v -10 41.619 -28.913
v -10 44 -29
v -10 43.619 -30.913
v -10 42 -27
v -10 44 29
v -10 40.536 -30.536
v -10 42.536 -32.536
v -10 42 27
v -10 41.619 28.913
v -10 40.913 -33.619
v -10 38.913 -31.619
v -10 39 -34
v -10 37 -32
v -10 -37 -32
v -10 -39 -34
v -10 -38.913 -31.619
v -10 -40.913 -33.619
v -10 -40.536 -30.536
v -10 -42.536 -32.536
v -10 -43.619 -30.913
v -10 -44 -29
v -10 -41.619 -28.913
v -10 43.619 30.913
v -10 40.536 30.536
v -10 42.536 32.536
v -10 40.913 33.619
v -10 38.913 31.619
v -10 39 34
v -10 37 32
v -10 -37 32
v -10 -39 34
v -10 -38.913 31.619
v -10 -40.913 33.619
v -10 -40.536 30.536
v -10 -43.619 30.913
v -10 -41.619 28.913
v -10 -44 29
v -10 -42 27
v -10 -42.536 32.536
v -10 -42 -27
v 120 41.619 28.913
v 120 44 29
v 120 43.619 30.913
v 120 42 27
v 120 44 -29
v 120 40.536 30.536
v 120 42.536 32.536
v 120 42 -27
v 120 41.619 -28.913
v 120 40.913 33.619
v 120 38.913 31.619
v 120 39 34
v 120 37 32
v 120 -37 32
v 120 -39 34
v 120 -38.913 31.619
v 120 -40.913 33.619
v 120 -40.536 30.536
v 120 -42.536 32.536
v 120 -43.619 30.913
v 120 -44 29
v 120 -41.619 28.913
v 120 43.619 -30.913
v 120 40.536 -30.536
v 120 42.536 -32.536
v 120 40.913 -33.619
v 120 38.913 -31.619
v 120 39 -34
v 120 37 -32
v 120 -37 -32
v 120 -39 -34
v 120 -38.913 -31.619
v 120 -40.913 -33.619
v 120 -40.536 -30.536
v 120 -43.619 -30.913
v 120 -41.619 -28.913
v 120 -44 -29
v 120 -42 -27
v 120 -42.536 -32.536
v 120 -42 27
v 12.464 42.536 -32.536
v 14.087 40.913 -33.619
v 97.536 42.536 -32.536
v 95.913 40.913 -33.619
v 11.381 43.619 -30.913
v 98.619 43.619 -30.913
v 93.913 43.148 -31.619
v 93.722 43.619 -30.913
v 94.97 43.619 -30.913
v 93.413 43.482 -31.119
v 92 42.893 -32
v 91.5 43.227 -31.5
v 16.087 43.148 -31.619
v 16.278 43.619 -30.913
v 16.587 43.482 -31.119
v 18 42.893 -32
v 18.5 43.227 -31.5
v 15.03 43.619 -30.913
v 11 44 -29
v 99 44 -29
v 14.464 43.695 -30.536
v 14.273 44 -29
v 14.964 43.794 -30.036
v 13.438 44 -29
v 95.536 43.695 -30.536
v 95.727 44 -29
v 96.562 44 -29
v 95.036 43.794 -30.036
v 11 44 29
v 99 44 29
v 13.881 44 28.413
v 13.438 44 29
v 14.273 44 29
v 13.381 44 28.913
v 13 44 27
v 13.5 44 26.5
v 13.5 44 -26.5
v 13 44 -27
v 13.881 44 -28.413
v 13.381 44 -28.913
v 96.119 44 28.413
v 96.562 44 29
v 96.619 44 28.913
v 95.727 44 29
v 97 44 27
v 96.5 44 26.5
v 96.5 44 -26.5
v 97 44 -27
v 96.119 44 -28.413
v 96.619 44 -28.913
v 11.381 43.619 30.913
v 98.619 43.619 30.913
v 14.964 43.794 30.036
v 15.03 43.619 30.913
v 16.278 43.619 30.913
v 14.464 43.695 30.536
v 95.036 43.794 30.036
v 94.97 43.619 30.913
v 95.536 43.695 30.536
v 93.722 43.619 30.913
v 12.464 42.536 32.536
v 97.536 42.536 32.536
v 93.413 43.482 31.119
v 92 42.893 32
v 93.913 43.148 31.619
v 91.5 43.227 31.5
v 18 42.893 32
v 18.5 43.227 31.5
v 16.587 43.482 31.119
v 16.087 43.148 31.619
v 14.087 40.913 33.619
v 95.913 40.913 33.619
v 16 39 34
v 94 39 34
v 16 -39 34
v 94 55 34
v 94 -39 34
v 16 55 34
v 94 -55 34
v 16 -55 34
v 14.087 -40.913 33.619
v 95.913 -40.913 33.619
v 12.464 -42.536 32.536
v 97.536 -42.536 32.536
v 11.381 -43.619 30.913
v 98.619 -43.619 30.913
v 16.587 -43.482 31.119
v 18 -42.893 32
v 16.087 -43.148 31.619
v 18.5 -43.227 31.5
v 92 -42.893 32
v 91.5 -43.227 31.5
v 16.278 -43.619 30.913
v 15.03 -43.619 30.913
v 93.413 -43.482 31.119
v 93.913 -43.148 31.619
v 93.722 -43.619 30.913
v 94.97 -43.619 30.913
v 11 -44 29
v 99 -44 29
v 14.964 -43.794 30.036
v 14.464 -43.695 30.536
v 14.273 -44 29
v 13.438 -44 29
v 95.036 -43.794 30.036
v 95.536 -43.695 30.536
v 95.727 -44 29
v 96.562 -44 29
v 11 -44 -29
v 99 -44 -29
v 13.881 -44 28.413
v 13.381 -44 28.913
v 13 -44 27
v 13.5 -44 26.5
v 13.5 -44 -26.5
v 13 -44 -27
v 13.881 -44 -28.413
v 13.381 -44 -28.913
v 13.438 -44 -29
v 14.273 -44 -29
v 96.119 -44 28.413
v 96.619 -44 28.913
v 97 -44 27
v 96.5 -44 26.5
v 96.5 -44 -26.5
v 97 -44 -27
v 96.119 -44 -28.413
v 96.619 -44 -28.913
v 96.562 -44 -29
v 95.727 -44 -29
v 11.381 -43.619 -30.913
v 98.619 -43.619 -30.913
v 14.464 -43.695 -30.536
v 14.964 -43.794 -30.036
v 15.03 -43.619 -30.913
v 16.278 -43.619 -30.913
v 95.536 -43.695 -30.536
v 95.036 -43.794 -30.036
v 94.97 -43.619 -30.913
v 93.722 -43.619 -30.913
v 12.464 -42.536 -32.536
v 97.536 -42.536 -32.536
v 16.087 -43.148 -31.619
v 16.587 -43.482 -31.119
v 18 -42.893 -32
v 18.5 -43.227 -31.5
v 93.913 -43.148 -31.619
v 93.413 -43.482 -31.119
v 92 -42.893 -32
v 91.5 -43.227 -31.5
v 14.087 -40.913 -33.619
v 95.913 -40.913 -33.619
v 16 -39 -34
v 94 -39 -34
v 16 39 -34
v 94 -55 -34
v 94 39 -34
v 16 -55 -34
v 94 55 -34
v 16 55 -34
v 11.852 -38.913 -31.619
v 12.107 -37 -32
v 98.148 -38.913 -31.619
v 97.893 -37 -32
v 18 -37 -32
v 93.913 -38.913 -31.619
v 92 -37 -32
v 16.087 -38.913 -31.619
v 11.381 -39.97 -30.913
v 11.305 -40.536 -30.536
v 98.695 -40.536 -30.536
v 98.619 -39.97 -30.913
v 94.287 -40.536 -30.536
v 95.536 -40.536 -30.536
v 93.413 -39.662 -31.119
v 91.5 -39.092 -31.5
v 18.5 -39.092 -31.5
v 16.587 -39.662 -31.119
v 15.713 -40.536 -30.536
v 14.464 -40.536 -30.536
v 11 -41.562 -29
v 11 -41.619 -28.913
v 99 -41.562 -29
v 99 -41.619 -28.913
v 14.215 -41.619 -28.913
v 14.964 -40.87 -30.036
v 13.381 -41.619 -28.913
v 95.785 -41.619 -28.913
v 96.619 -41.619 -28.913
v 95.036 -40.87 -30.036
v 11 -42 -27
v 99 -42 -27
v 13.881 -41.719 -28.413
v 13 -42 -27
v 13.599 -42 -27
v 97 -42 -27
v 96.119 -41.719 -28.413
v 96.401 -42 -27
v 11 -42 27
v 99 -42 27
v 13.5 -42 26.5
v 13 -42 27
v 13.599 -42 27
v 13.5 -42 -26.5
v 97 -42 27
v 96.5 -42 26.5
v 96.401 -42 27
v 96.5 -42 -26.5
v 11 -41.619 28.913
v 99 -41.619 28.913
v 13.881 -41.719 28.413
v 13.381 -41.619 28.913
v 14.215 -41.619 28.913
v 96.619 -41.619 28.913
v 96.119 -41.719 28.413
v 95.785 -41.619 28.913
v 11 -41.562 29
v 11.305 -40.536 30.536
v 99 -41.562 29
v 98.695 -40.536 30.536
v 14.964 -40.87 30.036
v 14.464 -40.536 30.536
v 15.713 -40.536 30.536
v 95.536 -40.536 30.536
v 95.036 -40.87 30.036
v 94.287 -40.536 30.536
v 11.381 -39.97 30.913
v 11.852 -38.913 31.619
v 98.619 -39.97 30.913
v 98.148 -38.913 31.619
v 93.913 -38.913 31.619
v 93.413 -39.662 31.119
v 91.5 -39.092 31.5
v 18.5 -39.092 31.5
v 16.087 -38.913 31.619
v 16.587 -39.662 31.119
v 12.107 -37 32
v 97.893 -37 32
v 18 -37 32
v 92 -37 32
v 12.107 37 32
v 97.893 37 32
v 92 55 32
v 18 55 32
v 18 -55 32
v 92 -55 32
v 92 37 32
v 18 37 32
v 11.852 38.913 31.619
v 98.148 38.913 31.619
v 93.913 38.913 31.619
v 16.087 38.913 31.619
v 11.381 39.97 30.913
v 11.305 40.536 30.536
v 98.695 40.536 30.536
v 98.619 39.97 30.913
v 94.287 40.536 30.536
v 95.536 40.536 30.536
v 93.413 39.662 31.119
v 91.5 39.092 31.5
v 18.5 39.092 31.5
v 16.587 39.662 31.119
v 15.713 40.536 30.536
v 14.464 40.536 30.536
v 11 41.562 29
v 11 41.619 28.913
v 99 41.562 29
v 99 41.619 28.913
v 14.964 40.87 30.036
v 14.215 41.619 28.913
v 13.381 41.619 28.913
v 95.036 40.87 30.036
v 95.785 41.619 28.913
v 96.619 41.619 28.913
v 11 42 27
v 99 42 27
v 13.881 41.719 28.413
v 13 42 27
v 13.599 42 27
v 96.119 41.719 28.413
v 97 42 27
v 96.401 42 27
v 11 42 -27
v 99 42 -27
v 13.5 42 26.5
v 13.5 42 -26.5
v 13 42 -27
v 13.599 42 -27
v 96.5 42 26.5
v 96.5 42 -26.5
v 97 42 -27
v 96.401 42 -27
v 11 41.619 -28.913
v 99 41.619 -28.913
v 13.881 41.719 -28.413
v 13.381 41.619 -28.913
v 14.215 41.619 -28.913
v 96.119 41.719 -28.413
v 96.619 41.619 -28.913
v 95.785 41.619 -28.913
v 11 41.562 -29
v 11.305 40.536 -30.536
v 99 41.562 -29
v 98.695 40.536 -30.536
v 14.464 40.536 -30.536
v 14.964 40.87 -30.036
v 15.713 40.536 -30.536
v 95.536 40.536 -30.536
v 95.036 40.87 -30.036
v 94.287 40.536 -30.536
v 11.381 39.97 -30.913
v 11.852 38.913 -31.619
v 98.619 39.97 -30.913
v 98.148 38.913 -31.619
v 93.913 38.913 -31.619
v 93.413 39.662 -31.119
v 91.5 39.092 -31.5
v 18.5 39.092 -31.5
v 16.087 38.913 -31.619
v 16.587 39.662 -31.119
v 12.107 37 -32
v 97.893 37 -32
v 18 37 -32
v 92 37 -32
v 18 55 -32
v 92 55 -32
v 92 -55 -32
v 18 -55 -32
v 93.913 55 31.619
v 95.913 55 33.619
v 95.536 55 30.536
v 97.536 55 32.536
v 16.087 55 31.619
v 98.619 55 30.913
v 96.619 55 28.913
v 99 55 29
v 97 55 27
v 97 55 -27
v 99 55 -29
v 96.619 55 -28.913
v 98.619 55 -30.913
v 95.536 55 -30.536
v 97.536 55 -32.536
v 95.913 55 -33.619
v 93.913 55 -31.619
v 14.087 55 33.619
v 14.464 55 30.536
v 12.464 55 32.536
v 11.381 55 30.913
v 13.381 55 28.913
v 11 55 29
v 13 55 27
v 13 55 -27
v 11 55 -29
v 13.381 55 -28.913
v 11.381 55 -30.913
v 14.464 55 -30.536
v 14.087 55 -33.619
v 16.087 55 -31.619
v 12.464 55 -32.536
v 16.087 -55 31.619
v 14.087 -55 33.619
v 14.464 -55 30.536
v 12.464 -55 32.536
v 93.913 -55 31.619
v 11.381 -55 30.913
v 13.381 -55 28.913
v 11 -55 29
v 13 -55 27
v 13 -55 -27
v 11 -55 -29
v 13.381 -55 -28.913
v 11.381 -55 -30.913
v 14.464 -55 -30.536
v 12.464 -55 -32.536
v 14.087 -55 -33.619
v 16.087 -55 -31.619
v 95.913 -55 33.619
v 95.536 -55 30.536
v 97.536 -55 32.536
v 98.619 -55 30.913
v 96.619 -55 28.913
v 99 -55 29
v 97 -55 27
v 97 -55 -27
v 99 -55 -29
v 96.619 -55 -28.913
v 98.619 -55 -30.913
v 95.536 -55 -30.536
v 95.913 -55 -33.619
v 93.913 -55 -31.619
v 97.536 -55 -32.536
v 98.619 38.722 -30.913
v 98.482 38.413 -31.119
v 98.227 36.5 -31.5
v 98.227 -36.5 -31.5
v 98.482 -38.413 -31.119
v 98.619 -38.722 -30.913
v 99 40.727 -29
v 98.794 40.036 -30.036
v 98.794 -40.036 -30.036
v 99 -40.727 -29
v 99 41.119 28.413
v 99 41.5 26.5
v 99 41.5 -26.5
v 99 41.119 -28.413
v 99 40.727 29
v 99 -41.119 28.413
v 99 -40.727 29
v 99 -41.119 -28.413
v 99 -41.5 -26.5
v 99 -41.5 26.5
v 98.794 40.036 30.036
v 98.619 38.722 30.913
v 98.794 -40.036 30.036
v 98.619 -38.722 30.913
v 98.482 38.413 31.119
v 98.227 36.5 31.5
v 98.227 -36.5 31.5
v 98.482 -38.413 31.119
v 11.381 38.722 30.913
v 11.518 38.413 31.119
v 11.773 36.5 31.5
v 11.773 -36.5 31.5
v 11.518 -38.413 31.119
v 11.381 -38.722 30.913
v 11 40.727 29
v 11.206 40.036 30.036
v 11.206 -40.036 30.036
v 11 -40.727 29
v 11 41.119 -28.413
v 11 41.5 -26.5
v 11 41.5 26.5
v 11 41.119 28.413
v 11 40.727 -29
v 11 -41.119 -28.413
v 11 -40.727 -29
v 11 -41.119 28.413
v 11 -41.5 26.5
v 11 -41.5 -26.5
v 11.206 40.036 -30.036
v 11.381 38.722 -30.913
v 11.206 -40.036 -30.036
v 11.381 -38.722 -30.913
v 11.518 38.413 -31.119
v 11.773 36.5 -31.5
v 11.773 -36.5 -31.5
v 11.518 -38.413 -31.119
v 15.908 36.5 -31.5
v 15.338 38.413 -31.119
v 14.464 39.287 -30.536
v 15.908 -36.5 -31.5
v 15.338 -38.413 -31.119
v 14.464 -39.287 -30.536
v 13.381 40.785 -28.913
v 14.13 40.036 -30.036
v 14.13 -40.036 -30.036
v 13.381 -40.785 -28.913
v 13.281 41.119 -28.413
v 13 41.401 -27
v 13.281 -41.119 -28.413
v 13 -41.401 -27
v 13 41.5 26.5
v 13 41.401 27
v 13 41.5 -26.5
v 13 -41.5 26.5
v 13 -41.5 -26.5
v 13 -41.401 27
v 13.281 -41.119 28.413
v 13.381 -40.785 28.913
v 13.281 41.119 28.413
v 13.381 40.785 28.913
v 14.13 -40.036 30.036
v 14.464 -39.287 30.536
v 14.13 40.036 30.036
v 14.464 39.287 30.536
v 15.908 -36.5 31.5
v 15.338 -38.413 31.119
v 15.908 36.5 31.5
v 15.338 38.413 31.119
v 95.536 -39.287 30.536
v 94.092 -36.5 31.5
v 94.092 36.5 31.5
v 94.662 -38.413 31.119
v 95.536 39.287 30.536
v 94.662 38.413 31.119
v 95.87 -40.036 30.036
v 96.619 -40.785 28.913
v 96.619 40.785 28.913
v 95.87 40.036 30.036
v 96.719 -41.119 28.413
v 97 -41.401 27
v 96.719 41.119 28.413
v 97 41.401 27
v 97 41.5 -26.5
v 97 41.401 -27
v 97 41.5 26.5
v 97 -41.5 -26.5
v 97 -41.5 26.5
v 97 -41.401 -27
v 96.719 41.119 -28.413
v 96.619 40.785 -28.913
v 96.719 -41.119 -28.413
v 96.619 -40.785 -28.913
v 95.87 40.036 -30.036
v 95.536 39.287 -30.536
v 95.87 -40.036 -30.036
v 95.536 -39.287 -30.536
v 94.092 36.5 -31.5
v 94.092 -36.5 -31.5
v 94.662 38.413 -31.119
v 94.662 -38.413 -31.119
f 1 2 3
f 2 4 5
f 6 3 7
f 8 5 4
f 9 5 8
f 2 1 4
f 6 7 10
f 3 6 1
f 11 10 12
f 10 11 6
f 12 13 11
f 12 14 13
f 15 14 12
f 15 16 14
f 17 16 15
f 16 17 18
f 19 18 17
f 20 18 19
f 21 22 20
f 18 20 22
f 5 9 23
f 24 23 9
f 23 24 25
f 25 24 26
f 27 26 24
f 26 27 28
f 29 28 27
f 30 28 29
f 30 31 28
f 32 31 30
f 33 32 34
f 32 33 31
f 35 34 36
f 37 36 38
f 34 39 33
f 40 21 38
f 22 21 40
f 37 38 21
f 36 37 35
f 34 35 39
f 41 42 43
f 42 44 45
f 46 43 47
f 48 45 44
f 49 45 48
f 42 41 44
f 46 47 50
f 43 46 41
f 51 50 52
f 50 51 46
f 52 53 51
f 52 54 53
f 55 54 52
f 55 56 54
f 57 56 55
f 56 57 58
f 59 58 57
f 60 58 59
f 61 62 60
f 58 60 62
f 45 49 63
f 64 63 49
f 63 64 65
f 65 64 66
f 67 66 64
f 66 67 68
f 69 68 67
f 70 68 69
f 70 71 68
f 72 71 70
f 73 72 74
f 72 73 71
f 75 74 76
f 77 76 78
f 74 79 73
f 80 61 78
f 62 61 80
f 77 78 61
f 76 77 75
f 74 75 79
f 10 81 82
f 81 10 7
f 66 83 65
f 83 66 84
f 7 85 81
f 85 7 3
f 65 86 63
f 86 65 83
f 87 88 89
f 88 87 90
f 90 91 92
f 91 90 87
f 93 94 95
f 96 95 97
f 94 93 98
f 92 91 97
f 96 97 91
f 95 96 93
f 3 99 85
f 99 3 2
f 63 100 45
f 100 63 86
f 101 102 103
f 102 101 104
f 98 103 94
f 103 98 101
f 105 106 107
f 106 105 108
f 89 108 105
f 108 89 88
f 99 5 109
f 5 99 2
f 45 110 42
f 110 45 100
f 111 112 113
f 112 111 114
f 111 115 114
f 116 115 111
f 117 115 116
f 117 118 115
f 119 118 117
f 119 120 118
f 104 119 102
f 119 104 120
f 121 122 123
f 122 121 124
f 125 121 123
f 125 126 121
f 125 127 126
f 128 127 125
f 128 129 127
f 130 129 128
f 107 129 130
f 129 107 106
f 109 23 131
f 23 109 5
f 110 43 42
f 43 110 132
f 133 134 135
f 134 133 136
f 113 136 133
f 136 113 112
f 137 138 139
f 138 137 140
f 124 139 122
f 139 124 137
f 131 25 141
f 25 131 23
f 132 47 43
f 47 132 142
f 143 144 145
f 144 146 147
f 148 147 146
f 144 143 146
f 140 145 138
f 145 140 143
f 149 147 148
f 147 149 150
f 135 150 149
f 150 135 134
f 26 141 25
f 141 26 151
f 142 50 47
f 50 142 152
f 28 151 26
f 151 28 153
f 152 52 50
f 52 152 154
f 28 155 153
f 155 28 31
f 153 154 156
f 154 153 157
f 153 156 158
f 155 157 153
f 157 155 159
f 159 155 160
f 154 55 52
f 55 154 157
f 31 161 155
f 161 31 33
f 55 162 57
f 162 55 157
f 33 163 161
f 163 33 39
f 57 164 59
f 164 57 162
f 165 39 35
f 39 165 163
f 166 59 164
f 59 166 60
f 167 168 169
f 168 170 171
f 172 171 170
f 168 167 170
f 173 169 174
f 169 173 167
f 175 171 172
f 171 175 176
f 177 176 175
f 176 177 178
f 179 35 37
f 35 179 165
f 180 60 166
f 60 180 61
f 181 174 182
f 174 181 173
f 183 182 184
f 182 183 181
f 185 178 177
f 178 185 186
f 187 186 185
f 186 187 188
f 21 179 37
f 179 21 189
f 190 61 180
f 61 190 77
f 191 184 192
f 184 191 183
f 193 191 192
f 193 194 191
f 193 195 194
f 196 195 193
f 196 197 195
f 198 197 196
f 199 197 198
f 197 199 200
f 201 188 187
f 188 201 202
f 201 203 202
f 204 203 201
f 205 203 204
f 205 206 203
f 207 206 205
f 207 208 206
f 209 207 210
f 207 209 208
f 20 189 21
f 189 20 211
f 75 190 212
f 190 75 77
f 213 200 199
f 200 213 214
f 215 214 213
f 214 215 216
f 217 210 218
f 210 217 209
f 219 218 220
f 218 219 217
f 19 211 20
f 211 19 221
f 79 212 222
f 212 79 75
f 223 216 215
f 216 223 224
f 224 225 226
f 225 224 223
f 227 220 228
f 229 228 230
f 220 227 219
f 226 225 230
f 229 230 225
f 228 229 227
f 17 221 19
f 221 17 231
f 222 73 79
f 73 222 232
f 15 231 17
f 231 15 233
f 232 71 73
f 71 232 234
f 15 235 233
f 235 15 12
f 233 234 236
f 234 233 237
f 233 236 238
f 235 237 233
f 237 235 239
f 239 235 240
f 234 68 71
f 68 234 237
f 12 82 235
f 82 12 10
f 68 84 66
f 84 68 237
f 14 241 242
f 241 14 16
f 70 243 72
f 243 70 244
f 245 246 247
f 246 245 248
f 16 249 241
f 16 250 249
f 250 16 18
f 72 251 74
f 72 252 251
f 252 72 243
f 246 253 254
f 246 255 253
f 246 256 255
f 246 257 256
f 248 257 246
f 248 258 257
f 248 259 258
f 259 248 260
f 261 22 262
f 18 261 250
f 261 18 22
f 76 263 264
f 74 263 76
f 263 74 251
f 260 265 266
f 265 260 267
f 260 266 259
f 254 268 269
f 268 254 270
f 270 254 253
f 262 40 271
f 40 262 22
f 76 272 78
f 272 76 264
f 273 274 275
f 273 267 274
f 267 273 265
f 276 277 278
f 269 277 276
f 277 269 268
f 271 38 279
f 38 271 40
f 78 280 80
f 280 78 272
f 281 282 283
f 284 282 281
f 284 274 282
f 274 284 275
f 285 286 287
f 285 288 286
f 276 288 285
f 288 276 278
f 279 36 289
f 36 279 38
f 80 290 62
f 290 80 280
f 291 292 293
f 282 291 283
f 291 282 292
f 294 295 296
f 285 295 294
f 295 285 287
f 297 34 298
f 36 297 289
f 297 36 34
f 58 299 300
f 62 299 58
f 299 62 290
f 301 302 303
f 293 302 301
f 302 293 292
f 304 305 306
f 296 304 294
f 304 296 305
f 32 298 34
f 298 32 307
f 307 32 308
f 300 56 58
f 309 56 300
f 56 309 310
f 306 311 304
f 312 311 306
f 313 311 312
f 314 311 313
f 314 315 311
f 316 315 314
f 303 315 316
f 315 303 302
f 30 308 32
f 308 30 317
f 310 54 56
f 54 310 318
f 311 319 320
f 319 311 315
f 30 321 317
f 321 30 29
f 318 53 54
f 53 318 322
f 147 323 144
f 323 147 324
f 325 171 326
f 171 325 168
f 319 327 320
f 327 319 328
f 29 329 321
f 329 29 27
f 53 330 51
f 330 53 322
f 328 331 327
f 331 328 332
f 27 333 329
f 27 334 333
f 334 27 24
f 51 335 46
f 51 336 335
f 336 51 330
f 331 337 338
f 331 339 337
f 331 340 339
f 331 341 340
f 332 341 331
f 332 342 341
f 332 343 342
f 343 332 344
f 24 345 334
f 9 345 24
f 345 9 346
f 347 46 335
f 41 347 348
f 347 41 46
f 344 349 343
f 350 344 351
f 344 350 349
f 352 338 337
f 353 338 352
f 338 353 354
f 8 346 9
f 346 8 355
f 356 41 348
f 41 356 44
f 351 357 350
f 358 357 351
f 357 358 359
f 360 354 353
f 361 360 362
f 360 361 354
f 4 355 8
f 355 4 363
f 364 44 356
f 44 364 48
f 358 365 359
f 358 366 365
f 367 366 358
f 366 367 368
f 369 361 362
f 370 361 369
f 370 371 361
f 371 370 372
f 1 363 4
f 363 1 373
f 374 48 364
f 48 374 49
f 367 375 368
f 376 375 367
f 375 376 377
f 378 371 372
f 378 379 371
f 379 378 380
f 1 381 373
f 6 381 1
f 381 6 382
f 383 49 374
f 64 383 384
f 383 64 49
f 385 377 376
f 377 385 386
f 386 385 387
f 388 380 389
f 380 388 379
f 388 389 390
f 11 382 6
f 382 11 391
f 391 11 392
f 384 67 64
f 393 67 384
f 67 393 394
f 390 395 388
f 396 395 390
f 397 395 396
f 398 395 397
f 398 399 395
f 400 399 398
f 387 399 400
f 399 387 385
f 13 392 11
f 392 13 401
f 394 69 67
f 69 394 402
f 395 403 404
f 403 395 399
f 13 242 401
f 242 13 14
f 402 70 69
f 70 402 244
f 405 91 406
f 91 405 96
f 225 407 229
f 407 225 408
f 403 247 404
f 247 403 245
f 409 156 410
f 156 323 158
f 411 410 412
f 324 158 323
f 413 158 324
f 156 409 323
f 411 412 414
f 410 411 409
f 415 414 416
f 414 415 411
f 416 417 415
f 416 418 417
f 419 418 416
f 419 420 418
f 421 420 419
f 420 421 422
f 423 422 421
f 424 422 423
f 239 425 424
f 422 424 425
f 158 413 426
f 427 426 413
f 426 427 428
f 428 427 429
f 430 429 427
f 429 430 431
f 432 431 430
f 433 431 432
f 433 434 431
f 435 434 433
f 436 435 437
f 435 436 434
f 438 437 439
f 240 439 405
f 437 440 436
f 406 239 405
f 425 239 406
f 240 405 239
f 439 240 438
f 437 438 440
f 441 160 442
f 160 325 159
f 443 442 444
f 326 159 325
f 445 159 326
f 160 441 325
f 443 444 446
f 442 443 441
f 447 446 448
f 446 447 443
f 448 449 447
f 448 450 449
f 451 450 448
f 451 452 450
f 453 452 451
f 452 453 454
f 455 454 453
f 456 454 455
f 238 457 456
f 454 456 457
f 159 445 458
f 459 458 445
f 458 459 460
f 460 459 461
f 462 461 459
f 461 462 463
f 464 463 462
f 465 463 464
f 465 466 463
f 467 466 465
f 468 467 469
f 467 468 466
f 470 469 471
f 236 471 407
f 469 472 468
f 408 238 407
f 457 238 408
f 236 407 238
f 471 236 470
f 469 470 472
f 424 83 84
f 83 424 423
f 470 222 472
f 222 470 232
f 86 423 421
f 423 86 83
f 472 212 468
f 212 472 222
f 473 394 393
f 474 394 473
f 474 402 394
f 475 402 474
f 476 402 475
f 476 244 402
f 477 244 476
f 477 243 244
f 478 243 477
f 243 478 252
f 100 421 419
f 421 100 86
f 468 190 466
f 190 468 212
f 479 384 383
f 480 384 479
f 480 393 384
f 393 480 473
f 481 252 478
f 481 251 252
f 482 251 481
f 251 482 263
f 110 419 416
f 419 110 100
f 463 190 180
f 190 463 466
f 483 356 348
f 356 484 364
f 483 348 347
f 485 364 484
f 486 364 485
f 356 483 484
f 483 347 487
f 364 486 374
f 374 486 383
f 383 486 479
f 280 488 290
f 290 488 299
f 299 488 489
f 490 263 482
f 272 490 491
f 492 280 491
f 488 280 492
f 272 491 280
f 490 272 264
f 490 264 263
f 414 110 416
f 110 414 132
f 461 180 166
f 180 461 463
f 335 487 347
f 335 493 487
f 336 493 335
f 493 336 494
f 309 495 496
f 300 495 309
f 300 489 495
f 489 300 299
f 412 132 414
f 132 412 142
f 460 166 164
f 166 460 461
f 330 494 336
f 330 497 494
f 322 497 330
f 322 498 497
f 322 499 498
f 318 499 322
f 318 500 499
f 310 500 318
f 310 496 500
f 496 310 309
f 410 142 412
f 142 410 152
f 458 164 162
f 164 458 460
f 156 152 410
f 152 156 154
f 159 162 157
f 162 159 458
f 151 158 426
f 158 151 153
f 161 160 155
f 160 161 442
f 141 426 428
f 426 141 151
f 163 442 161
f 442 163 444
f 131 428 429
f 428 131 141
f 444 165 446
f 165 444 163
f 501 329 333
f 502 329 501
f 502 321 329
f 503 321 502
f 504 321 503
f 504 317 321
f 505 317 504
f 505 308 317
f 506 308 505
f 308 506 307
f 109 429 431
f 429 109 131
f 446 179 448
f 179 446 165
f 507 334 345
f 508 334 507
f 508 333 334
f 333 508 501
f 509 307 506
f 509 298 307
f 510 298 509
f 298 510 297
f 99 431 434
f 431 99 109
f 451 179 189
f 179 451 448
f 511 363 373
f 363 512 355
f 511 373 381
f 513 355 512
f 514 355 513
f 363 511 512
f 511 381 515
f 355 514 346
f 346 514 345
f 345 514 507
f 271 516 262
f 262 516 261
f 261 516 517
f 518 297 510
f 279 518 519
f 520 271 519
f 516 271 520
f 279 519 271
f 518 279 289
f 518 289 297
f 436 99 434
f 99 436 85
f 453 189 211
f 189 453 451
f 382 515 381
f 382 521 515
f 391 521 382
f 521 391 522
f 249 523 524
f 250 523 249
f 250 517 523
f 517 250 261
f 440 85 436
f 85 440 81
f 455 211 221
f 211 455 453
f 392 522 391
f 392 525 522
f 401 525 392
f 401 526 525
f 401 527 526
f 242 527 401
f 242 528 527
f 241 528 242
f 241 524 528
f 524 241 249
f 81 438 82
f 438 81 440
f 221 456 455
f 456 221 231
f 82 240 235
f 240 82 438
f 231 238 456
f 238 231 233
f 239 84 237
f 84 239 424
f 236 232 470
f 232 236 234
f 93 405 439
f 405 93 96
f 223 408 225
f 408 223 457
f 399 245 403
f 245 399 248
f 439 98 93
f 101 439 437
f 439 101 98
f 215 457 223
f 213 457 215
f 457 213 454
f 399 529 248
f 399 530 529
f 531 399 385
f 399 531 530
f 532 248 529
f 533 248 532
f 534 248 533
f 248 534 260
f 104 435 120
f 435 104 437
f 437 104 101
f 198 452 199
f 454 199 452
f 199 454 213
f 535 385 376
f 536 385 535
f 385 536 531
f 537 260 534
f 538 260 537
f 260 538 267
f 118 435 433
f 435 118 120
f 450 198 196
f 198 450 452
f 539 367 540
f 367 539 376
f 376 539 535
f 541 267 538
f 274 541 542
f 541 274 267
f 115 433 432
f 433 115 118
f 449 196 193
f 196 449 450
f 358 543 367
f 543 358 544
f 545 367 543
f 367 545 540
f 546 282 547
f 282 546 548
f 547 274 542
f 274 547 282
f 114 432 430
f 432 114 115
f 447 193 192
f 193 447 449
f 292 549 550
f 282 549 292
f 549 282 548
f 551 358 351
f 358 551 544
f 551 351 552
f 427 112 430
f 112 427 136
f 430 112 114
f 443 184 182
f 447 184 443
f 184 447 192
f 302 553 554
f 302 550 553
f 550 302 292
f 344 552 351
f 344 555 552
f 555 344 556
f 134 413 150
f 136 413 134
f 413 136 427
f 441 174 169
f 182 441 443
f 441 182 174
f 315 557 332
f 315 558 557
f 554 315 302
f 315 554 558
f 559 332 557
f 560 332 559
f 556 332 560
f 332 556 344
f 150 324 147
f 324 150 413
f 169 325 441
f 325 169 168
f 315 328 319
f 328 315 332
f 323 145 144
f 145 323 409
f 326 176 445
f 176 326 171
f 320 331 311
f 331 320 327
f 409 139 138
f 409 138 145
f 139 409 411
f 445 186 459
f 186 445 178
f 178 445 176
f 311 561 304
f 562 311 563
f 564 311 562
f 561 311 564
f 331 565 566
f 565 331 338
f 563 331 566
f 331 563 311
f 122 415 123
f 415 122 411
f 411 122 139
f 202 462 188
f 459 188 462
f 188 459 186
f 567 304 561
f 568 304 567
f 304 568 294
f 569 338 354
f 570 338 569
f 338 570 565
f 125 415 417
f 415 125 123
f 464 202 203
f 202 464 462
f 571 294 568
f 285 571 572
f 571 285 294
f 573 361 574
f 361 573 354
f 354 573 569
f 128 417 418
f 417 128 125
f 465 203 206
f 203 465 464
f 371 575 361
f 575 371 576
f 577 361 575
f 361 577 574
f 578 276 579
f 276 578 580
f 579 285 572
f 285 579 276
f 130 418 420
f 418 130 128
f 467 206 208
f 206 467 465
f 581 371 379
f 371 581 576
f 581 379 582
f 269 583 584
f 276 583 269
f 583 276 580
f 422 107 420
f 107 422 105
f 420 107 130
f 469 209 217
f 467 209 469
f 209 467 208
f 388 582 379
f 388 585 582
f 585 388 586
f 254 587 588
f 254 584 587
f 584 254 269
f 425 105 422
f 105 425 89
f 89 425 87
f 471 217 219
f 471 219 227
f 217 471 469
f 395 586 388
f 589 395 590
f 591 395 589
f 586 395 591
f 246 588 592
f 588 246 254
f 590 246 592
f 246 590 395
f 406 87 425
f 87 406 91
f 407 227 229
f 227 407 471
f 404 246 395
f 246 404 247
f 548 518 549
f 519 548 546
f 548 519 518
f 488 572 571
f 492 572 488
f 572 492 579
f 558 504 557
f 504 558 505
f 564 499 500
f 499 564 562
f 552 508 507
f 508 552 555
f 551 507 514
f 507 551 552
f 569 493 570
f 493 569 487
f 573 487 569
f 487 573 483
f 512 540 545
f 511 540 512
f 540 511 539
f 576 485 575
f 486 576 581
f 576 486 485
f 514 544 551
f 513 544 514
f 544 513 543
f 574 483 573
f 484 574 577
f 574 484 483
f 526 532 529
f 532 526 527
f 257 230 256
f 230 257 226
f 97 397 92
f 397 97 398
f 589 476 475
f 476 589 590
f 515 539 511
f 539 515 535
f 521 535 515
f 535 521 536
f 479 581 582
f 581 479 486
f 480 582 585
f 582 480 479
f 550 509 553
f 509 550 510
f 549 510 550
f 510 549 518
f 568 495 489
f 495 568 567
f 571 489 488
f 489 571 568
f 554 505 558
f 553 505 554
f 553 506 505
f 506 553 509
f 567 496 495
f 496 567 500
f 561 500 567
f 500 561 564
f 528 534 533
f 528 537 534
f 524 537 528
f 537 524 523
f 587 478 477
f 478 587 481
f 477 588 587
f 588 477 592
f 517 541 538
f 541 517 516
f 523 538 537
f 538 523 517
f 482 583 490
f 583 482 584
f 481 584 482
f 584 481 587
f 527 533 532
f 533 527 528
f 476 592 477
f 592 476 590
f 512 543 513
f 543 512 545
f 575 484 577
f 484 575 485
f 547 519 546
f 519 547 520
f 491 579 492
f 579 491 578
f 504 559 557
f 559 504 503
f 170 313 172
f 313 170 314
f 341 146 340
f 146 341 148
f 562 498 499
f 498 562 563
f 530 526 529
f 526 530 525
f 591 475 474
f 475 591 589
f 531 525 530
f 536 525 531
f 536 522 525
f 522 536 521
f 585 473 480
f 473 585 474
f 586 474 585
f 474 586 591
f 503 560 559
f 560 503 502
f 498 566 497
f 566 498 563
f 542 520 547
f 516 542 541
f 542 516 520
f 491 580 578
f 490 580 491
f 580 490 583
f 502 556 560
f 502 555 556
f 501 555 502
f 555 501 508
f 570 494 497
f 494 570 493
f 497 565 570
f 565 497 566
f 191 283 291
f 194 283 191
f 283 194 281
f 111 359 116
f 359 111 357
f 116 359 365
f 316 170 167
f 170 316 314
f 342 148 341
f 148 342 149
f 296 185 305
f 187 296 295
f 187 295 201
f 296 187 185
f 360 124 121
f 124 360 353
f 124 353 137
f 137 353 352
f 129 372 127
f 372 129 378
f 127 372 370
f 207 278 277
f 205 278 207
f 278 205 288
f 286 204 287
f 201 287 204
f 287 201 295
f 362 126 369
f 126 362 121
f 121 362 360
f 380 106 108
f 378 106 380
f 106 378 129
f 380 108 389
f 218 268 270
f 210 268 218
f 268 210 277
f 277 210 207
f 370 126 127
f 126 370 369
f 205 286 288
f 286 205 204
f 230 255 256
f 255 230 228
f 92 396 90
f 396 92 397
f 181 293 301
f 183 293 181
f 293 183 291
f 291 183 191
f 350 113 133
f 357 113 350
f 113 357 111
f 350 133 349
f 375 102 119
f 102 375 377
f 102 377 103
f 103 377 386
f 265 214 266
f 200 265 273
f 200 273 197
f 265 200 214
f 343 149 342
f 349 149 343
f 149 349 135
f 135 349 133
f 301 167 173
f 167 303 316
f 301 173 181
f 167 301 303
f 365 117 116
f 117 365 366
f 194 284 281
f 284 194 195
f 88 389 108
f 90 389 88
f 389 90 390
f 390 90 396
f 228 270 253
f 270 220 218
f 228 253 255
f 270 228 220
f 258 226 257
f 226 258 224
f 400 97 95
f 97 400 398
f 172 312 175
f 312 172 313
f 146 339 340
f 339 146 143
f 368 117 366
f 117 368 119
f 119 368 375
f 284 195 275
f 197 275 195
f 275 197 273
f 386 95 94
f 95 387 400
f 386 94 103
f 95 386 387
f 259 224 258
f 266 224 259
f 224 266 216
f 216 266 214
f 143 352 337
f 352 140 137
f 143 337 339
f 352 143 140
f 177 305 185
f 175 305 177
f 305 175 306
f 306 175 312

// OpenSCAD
outerwidth1 = 78;
outerheight1 = 58;
height1 = 110;
wallThickness1 = 4;

outerwidth2 = 73;
outerheight2 = 53;
height2 = 100;
wallThickness2 = 4;


difference()
{
    crossTube(outerwidth1, outerheight1, wallThickness1, height1,
        outerwidth1, outerheight1, wallThickness1, height1);
    
    solidCrossTube(outerwidth2, outerheight2, wallThickness2, height1,
    outerwidth2, outerheight2, wallThickness2, height1);
    
}


module squareTube(outerwidth, outerheight, wallThickness, height)
{
        linear_extrude(height,true)
    difference()
    {
        minkowski()
        {
        square([outerwidth, outerheight],true);
            circle(5);
        }
        minkowski()
        {
        square([outerwidth-wallThickness,outerheight-wallThickness],true);
                        circle(5);
        }
    }
}

module crossTube(outerwidth1, outerheight1, wallThickness1, height1,
                outerwidth2, outerheight2, wallThickness2, height2)
{
    union()
    {
        translate([-10,0,0])
        rotate([90,0,90]) 
        squareTube(outerwidth1,outerheight1,wallThickness1,height1+20);


        translate([height1/2,height1/2,0])
        rotate([90,0,0]) 
        squareTube(outerwidth1,outerheight1,wallThickness2,height1);
    }
}

module solidTube(outerwidth, outerheight, wallThickness, height)
{
    linear_extrude(height,true)
    minkowski()
    {
        square([outerwidth, outerheight],true);
        circle(5);
    }
}

module solidCrossTube(outerwidth1, outerheight1, wallThickness1, height1,
                outerwidth2, outerheight2, wallThickness2, height2)
{
    union()
    {
    rotate([90,0,90]) 
    solidTube(outerwidth1,outerheight1,wallThickness1,height1);


    translate([height1/2,height1/2,0])
    rotate([90,0,0]) 
    solidTube(outerwidth1,outerheight1,wallThickness2,height1);
    }
}
